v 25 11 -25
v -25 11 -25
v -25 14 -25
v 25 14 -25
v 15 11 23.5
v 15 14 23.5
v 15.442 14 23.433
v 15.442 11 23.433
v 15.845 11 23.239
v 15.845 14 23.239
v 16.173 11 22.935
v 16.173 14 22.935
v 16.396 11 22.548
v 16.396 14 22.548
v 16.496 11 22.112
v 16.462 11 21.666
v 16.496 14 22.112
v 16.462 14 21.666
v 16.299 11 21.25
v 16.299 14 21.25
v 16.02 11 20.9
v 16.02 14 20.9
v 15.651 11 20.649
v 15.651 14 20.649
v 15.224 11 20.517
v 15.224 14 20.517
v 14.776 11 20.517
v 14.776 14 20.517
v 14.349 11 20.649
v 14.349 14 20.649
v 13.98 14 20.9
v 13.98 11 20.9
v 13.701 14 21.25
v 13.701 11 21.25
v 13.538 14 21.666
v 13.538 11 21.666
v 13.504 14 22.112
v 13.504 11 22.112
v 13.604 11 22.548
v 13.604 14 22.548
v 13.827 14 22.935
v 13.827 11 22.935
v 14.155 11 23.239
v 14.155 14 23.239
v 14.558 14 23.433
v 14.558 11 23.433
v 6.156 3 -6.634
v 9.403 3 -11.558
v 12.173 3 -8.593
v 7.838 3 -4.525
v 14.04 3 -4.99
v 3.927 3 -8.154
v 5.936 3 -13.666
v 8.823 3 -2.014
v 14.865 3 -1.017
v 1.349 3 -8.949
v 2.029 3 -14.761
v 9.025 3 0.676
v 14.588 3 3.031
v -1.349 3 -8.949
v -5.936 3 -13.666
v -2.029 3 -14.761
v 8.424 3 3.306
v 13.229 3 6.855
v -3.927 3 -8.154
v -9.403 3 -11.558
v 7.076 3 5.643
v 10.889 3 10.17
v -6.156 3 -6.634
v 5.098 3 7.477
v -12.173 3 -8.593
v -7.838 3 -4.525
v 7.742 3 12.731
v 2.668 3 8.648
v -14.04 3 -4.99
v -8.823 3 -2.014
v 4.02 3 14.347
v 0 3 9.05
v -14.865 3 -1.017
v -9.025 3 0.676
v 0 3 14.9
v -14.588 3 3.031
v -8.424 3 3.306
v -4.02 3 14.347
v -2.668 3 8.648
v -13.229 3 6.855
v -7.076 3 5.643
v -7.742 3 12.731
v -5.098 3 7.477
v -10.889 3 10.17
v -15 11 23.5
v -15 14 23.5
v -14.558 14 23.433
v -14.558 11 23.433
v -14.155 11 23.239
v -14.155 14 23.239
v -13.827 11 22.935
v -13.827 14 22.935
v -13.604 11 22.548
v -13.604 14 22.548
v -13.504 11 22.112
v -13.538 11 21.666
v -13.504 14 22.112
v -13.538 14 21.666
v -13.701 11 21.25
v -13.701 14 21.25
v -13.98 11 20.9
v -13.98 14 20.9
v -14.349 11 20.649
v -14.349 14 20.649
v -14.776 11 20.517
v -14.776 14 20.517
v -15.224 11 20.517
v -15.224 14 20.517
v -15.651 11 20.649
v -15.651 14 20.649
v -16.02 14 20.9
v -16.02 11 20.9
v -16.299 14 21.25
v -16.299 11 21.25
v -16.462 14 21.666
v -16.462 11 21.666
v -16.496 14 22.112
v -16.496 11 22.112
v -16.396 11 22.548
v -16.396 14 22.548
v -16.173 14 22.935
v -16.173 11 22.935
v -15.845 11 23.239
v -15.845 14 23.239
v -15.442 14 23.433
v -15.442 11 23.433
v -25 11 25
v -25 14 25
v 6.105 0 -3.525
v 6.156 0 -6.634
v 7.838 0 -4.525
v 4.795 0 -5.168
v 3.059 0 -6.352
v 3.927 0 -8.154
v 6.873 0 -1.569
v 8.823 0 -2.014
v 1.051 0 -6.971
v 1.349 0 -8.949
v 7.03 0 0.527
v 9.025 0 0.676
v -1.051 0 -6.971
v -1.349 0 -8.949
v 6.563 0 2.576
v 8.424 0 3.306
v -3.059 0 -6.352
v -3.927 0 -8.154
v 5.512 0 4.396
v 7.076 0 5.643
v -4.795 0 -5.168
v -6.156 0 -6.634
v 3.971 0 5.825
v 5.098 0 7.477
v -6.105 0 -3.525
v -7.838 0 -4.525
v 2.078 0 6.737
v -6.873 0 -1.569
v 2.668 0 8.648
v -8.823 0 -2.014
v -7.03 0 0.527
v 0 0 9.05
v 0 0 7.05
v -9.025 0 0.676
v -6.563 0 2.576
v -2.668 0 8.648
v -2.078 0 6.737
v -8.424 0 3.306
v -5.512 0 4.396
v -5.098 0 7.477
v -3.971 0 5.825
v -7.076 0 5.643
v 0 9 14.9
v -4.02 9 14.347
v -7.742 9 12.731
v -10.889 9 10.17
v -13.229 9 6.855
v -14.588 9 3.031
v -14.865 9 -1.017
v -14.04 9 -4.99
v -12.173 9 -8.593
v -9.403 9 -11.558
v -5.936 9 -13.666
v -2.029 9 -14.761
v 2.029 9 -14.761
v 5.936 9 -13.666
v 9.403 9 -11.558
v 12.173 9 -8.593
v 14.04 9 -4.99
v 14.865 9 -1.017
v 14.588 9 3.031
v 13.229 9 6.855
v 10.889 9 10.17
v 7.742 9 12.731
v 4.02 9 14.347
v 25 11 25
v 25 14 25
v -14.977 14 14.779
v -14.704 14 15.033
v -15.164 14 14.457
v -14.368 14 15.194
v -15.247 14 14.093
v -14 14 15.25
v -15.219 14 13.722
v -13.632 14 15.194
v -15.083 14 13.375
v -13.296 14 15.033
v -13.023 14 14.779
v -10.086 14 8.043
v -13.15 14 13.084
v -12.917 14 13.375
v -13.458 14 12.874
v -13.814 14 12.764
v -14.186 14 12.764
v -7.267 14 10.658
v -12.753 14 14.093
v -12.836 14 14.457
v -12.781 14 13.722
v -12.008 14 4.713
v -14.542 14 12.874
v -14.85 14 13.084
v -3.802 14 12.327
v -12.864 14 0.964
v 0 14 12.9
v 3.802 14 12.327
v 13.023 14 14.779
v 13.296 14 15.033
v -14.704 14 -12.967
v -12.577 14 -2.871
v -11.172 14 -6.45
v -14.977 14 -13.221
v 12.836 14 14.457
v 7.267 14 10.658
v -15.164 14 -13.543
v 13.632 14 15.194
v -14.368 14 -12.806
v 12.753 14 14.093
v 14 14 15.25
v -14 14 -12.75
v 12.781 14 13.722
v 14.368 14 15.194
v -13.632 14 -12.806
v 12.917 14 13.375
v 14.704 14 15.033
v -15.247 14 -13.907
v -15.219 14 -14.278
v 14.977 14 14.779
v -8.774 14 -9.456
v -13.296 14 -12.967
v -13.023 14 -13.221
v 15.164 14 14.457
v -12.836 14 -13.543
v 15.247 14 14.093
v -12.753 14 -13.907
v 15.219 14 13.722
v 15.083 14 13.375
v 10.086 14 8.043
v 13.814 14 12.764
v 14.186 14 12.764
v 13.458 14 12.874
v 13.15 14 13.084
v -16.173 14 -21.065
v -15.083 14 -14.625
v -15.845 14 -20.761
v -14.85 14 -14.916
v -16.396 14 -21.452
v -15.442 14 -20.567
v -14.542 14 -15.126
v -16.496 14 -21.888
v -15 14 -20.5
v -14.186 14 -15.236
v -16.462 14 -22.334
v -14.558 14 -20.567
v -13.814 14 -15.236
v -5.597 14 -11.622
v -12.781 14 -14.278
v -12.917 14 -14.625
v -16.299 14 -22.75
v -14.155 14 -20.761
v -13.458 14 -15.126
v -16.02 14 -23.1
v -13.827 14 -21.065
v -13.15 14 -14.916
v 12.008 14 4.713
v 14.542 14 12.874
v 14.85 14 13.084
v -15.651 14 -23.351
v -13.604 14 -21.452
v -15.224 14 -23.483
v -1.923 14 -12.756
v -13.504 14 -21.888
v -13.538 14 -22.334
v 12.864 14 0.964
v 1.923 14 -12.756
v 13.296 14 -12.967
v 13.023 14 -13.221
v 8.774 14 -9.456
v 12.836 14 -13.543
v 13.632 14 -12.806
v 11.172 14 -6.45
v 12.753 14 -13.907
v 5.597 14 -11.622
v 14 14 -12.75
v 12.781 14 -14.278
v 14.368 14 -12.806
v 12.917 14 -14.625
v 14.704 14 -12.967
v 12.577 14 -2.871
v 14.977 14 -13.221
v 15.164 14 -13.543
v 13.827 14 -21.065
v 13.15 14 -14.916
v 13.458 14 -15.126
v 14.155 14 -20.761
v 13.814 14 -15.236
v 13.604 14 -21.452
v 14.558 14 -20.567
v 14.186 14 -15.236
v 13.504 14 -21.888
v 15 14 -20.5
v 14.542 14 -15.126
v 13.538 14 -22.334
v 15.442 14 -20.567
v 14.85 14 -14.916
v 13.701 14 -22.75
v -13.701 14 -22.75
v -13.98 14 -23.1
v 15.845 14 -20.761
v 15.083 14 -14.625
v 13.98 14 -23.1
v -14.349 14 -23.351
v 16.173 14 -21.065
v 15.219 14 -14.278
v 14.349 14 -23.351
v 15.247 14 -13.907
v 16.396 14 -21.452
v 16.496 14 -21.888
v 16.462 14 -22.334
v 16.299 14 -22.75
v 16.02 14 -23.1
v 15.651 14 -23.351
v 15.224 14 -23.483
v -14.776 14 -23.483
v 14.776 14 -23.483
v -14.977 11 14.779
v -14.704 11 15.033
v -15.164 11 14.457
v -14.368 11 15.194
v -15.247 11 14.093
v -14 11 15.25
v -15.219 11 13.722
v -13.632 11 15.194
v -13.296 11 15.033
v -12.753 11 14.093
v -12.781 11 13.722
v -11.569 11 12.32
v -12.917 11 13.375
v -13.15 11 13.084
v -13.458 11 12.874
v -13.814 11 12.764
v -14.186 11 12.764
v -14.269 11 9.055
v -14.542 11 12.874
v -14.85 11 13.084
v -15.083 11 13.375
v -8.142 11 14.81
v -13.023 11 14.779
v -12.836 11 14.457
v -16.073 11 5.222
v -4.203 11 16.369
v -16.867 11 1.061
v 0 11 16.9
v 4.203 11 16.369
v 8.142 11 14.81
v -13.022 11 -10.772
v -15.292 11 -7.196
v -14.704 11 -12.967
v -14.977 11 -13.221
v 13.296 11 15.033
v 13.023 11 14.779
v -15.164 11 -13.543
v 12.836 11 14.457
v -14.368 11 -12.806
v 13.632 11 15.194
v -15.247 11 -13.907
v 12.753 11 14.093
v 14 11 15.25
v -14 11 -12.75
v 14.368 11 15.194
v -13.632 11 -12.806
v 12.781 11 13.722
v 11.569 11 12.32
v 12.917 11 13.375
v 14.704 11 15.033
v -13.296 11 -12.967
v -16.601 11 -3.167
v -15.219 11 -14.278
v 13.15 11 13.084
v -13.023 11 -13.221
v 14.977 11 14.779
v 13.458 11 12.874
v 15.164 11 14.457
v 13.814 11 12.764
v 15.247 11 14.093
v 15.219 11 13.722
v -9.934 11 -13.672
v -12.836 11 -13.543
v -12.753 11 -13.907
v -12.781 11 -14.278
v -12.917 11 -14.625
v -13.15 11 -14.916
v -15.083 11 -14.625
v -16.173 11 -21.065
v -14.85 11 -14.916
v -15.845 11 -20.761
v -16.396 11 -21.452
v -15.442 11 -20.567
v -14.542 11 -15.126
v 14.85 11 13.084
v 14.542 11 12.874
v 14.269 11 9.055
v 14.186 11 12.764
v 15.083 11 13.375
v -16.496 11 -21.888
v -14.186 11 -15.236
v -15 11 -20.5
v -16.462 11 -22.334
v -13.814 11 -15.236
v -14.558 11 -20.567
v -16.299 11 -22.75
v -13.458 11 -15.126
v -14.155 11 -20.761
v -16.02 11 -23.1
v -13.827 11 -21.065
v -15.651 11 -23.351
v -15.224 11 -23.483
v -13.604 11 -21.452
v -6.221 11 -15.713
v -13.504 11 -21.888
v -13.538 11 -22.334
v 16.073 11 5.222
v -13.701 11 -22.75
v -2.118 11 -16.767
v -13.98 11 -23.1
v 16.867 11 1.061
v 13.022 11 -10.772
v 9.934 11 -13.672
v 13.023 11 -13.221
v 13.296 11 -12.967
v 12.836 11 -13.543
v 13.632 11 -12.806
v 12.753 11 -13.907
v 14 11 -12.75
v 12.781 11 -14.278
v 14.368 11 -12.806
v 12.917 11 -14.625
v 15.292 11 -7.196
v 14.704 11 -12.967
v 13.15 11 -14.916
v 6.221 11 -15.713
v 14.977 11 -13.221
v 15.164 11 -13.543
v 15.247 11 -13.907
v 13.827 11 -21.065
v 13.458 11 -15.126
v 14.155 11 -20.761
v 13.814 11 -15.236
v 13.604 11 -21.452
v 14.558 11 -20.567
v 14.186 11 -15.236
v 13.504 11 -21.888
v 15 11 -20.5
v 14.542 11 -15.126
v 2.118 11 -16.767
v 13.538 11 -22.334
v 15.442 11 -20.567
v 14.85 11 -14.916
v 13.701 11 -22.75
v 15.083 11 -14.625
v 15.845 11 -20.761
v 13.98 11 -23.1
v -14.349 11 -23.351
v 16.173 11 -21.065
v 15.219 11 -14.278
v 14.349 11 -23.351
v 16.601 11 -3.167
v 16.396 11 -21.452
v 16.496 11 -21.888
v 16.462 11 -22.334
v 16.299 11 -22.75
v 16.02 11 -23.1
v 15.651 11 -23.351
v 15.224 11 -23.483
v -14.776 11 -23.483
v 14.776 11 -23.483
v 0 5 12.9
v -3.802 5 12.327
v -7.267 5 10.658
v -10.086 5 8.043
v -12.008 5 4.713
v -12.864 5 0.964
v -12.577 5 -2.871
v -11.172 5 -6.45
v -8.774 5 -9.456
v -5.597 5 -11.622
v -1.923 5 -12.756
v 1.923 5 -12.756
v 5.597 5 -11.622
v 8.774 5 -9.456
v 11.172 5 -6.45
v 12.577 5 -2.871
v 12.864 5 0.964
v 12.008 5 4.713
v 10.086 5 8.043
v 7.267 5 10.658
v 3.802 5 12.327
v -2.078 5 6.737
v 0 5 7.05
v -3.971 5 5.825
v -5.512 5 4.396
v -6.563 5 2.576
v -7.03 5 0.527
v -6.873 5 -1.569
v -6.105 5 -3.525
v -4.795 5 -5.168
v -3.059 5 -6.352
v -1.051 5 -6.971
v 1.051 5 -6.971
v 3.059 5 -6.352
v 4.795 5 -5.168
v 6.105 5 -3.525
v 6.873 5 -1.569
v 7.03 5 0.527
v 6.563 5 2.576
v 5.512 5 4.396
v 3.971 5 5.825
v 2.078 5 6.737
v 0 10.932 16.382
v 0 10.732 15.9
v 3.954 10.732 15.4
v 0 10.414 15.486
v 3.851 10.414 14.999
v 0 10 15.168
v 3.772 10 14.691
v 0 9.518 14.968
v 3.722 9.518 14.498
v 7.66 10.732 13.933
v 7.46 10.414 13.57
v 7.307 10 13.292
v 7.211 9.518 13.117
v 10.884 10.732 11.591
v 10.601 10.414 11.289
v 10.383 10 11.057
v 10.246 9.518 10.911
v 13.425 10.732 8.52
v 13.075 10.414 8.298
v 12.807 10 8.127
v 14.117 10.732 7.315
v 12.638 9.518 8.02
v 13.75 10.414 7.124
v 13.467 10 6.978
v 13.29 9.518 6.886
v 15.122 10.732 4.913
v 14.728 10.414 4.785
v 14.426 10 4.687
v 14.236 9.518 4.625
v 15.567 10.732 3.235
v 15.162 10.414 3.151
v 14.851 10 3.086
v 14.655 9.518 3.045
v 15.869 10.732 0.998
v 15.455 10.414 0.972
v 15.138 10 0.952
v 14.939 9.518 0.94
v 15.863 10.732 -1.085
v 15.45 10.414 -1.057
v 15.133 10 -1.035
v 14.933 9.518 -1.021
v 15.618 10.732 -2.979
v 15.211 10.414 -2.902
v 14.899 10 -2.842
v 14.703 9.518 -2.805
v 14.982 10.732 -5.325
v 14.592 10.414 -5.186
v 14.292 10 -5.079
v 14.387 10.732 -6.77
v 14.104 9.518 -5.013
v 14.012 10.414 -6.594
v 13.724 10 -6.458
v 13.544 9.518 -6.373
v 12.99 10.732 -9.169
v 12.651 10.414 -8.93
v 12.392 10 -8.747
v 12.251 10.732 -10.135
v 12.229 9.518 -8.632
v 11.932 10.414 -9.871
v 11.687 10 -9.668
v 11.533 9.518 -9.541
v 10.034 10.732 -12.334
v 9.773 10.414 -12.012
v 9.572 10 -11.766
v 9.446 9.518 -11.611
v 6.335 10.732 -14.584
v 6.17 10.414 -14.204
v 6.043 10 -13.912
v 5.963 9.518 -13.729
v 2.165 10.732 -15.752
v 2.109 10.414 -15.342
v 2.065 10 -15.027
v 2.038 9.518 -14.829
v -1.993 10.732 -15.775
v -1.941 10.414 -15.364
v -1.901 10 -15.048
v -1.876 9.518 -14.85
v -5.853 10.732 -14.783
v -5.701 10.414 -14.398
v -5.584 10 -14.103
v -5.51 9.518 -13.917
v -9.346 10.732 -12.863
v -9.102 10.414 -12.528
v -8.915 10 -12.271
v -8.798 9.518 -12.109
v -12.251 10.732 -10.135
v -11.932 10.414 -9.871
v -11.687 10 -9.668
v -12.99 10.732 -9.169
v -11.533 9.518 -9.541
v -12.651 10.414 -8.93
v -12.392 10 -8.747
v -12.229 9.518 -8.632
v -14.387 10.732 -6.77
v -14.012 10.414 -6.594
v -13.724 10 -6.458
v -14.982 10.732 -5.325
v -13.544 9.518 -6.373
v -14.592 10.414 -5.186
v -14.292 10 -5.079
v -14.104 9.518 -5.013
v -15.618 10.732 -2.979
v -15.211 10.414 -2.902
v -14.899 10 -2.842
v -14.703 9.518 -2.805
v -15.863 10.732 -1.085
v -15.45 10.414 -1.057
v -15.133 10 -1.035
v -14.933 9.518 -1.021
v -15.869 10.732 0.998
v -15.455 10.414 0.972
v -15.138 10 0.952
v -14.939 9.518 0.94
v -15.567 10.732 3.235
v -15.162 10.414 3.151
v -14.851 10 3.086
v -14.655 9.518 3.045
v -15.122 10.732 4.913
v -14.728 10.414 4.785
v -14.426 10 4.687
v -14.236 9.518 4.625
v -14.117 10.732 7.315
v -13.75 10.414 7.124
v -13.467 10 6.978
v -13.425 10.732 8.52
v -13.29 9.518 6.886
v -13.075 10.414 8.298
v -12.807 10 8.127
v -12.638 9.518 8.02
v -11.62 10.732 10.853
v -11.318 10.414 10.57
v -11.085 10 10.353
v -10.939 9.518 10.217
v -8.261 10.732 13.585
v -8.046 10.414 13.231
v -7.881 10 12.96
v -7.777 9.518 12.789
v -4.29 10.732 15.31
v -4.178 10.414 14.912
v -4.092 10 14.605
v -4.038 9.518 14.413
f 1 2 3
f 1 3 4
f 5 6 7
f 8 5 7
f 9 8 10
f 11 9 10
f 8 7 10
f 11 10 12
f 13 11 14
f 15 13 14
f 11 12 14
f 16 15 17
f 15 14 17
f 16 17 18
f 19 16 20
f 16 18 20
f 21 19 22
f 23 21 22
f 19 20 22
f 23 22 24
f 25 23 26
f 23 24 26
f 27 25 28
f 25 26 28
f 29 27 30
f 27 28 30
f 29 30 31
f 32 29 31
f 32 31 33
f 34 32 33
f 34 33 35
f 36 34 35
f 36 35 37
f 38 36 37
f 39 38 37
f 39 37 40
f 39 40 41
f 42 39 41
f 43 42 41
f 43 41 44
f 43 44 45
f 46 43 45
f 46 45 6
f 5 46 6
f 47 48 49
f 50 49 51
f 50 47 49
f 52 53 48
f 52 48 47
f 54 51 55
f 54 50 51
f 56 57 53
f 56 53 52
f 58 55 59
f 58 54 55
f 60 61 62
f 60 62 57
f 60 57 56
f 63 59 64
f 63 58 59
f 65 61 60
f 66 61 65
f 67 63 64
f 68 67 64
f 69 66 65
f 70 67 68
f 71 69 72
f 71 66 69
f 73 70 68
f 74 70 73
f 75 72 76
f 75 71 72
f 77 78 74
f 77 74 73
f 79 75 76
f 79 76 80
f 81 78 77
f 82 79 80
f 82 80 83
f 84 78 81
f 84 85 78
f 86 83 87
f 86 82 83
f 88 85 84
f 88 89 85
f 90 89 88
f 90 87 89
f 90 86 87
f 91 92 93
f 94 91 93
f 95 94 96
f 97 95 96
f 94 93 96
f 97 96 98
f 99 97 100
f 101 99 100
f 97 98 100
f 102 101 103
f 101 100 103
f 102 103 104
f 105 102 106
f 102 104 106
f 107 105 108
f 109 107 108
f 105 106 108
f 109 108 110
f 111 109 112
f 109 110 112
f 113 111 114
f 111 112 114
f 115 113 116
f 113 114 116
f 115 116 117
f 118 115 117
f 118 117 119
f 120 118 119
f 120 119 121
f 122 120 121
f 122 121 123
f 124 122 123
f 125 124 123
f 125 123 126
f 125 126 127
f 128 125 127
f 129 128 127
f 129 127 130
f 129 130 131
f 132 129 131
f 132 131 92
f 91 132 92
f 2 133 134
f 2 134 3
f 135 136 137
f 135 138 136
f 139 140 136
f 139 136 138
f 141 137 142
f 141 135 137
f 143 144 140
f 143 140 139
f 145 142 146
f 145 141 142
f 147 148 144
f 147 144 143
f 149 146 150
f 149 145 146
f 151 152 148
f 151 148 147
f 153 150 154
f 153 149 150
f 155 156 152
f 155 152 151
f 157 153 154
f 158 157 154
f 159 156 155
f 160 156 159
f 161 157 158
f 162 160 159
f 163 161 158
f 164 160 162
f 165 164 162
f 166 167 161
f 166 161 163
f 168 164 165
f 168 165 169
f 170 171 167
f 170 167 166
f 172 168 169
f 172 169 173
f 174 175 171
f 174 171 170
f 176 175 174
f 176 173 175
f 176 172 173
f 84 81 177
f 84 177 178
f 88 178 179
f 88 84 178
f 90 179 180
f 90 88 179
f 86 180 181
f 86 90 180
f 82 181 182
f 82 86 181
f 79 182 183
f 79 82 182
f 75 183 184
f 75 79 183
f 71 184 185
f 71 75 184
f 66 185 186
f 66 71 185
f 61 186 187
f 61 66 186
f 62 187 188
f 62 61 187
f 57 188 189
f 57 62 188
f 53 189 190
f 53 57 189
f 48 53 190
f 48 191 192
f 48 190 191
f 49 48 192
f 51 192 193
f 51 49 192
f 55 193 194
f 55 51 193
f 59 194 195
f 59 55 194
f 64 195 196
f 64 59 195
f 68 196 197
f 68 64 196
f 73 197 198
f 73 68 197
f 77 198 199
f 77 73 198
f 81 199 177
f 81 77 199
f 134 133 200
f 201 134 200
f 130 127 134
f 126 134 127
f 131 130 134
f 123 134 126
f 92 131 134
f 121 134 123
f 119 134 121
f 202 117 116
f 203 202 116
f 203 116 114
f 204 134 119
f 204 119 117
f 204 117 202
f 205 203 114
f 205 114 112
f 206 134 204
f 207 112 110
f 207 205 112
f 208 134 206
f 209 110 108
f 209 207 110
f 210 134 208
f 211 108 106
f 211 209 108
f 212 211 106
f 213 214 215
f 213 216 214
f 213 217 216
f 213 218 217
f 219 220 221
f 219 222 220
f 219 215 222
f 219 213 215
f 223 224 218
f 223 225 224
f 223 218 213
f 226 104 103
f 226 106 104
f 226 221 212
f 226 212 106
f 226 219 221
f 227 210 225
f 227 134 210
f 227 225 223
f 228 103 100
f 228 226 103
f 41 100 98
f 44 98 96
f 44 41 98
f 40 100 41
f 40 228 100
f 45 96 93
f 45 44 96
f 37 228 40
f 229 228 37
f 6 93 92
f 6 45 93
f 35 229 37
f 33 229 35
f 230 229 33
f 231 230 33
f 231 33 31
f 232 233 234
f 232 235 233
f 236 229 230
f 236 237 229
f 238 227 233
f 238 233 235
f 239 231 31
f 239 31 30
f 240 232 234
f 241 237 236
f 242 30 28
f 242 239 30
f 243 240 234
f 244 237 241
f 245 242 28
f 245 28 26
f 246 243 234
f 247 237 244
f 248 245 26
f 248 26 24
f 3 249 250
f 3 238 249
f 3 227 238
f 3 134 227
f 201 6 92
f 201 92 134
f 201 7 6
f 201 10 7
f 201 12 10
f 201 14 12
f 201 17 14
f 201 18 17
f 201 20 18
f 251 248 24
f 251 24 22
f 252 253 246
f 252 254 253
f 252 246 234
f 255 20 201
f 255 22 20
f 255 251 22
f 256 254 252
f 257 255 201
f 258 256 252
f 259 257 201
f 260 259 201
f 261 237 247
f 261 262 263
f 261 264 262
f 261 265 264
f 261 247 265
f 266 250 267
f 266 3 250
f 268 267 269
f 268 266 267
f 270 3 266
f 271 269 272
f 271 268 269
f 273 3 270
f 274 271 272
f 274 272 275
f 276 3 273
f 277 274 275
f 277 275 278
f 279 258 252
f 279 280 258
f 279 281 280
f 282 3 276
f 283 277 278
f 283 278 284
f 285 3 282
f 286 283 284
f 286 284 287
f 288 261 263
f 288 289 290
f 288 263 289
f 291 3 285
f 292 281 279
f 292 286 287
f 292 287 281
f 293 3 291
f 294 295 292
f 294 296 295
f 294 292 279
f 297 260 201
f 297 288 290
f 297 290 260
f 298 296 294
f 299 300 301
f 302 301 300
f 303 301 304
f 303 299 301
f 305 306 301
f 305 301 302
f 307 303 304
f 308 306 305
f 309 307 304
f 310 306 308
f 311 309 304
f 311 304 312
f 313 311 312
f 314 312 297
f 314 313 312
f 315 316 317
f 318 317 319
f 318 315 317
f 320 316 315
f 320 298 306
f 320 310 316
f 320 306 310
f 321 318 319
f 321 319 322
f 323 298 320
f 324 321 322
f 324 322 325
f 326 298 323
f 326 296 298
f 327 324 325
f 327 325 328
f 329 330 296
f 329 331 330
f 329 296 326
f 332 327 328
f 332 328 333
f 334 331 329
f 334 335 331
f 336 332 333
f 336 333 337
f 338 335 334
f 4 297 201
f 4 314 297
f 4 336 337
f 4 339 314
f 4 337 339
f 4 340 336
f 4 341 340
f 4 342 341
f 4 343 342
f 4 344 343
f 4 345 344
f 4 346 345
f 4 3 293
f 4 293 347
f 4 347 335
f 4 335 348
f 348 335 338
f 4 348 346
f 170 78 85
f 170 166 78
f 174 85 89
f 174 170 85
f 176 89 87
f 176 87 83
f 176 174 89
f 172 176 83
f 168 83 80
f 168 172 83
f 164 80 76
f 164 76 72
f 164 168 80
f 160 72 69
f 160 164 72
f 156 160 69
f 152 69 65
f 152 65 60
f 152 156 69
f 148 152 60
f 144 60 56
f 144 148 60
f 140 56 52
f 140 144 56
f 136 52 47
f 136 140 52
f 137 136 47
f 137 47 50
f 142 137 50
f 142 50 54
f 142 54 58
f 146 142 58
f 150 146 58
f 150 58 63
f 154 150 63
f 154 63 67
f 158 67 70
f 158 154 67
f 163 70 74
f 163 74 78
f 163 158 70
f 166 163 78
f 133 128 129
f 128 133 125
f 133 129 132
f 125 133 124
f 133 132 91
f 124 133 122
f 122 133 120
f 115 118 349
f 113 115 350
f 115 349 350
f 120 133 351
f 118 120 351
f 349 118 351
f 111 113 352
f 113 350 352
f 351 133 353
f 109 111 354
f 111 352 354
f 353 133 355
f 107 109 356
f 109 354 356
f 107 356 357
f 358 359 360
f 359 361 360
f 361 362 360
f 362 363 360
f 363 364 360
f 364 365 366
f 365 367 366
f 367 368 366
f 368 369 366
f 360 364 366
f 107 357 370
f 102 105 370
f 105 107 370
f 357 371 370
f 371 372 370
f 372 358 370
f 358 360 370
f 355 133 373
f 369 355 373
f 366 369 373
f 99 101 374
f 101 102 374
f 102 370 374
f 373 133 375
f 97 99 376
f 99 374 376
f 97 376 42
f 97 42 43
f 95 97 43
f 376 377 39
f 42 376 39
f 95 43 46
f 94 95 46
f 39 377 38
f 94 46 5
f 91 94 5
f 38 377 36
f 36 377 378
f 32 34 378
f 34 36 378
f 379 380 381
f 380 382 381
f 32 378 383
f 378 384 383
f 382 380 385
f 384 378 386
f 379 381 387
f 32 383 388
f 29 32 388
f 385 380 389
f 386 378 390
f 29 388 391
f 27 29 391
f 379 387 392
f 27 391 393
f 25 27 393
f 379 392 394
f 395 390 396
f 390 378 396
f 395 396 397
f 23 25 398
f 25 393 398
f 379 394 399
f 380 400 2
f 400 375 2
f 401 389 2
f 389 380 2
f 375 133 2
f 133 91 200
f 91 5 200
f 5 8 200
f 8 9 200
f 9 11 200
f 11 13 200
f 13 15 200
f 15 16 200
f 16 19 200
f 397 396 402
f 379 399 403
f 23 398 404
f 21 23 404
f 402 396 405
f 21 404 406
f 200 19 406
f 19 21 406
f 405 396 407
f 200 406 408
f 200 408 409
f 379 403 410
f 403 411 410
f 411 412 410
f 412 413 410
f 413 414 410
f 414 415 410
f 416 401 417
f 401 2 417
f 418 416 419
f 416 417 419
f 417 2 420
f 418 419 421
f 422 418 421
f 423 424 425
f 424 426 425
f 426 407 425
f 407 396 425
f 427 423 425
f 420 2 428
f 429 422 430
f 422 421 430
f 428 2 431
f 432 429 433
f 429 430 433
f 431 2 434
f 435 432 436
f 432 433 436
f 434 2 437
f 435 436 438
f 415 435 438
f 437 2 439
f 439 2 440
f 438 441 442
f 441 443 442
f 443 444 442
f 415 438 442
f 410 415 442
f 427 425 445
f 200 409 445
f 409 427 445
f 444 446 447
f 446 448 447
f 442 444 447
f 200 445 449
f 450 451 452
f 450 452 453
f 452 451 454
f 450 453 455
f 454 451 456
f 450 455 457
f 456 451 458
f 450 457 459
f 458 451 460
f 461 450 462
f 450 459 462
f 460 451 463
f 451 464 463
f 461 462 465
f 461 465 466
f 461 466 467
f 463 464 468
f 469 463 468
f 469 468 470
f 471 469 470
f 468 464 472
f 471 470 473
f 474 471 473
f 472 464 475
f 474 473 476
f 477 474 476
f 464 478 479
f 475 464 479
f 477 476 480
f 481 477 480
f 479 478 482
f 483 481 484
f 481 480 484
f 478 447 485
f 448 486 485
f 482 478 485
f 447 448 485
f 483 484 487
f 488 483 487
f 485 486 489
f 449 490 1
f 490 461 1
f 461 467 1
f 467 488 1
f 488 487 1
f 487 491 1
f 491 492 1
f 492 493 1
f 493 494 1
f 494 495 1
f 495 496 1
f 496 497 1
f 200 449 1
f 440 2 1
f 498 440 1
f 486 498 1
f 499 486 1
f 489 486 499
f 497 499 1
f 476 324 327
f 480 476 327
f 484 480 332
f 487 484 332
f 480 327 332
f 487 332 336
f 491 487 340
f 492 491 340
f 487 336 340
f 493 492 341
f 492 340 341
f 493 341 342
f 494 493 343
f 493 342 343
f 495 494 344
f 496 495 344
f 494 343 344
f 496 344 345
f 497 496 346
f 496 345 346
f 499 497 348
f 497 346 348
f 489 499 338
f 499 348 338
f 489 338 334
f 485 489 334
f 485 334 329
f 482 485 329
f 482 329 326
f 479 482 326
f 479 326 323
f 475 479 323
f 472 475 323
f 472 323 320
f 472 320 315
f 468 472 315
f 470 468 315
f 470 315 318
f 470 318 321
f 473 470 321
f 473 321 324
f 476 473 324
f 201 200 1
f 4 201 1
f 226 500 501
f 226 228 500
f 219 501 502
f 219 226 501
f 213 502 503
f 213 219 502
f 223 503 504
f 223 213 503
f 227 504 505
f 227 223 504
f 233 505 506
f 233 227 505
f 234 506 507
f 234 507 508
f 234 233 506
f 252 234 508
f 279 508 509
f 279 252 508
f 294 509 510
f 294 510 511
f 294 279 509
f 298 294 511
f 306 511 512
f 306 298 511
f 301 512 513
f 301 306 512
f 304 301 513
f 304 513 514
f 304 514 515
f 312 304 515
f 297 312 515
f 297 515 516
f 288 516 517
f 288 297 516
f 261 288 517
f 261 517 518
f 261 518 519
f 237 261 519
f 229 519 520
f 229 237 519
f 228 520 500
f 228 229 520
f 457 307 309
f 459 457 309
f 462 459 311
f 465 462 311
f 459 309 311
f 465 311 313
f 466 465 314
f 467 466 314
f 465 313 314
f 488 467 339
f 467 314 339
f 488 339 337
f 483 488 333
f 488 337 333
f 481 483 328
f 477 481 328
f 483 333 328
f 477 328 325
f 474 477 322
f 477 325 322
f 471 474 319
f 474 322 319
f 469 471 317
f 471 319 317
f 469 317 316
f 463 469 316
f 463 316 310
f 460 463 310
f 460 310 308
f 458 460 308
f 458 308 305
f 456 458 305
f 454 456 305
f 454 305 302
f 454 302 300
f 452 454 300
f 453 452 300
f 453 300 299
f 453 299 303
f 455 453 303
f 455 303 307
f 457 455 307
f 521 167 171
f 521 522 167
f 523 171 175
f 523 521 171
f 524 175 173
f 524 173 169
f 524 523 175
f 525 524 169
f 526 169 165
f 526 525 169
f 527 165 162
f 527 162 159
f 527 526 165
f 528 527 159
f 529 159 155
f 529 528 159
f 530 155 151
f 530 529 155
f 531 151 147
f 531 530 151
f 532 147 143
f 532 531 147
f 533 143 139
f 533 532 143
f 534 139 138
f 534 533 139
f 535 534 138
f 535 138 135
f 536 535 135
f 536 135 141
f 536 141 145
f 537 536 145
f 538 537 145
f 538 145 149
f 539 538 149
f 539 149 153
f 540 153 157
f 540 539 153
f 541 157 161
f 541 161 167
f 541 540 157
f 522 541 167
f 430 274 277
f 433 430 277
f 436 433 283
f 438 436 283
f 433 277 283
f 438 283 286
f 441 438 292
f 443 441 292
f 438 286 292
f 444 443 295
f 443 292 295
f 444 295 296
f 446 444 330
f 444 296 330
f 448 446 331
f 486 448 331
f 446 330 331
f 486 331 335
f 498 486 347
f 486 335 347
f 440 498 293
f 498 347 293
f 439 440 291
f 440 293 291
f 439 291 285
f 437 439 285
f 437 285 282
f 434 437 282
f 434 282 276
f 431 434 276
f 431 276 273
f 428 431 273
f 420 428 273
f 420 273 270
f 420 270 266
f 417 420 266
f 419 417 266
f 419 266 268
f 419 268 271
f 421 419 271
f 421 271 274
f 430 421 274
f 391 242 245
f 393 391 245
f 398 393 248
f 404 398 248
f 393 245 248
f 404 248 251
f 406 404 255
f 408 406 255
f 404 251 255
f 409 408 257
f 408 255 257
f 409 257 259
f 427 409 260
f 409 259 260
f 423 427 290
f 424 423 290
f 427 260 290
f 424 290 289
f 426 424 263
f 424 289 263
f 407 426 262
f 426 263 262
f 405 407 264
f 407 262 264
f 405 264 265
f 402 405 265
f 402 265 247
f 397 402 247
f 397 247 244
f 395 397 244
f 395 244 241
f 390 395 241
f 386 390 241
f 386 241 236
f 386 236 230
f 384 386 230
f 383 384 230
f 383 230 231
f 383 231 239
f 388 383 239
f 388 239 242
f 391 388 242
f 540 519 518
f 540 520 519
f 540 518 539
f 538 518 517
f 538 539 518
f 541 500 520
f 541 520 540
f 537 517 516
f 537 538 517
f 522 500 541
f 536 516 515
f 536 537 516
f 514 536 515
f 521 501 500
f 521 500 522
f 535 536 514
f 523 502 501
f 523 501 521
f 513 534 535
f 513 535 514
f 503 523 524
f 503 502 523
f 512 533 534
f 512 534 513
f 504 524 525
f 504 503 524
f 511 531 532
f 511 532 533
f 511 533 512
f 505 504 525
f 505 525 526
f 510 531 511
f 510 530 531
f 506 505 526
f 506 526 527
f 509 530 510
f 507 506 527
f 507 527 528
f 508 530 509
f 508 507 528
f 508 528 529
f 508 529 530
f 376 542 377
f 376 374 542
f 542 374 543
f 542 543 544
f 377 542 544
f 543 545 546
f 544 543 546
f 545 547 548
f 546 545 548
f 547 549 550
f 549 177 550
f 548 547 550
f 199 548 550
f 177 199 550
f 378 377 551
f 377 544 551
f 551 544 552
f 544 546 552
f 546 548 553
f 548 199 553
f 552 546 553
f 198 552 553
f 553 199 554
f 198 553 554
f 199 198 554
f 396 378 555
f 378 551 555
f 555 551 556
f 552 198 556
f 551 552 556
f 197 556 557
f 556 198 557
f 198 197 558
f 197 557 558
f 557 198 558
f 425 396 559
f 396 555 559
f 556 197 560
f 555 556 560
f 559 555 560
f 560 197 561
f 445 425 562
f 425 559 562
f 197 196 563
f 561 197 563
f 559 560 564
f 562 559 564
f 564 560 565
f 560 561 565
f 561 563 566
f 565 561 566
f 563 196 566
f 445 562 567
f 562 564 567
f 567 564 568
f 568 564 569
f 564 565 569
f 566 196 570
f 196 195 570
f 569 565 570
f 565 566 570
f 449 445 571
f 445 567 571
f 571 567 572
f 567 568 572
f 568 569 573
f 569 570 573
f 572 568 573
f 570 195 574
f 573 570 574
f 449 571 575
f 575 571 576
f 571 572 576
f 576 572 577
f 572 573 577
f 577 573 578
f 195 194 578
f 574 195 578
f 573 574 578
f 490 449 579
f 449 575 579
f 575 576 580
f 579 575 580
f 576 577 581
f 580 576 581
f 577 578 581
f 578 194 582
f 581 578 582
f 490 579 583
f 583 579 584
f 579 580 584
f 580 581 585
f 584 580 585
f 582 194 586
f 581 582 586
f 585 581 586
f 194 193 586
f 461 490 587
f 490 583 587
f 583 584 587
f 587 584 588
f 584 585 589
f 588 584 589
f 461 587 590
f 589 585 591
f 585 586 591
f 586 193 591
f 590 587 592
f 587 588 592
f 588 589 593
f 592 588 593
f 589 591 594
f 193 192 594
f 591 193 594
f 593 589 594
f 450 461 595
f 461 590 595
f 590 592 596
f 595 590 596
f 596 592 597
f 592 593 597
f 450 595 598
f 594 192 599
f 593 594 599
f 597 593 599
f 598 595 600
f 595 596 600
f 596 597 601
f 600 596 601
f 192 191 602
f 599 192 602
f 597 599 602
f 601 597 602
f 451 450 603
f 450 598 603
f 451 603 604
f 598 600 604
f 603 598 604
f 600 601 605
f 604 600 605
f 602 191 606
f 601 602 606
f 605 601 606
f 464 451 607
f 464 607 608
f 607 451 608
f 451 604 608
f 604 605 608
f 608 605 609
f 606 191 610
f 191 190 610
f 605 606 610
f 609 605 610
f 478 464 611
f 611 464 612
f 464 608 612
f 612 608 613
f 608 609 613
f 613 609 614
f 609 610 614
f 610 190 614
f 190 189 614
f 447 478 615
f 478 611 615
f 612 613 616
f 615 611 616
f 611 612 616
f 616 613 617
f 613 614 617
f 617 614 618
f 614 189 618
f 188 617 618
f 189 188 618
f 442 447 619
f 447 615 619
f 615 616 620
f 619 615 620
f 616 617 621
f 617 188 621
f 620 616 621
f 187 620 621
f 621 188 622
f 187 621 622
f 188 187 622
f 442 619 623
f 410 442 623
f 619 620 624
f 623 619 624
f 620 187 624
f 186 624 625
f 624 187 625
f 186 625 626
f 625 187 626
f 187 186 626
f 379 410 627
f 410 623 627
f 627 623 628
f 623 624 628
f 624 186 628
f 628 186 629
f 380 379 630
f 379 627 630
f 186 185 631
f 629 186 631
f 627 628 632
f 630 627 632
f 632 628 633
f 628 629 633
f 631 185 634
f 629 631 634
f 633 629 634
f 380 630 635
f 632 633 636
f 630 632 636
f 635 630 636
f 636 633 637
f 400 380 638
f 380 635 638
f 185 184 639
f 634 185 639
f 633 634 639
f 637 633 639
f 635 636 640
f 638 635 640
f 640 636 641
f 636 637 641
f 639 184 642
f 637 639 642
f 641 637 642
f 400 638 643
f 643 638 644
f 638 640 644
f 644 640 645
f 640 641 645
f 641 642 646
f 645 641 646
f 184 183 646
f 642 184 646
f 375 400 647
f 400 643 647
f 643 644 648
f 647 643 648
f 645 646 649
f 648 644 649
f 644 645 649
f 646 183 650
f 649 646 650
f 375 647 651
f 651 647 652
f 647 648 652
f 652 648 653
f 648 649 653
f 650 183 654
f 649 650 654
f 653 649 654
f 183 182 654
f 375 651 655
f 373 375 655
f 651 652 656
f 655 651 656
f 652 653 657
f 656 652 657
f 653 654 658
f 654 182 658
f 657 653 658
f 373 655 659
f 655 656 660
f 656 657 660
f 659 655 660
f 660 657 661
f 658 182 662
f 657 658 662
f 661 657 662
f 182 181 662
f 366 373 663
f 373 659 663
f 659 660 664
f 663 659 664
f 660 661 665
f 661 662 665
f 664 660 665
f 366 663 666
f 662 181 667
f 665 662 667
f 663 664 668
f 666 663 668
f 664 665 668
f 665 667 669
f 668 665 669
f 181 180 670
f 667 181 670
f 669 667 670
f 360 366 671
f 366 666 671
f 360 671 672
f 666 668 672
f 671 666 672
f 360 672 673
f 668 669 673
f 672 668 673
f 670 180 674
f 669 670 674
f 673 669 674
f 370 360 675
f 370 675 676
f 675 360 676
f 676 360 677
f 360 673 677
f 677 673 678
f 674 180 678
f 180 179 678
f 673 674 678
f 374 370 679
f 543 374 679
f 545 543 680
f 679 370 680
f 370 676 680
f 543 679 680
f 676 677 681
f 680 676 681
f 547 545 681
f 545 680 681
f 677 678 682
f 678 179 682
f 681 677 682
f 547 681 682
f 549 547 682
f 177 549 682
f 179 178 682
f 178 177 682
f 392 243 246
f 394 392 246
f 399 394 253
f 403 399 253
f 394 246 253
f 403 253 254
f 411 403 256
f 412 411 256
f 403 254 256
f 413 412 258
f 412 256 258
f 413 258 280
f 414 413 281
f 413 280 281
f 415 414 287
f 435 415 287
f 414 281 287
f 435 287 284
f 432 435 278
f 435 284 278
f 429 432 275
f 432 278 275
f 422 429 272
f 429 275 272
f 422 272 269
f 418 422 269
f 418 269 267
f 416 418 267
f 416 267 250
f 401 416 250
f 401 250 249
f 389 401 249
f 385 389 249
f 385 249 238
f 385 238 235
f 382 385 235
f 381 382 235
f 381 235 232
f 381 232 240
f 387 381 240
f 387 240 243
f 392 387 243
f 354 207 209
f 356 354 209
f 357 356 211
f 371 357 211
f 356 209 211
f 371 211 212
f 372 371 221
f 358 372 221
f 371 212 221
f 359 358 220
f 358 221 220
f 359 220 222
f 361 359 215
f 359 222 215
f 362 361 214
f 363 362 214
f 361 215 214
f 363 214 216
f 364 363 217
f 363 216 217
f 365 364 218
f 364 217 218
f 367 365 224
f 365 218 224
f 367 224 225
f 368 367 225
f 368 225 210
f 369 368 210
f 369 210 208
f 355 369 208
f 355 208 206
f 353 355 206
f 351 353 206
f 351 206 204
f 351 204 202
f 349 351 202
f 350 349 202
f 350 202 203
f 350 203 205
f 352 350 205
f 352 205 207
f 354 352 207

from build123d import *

# Parameters (mm, degrees)
BOSS_EXTRUDE1_START = -3
SKETCH3_W           = 50
SKETCH3_H           = 50
SKETCH3_R           = 14.9
BOSS_EXTRUDE1_DEPTH = 3
SKETCH4_R           = 1.25
SKETCH4_R_2         = 1.5
CUT_EXTRUDE1_DEPTH  = 39.026306684
FILLET1_R           = 2


with BuildPart() as part:
    # Sketch2 → Revolve-Thin1 (revolve)
    with BuildSketch(Plane.XY, mode=Mode.PRIVATE) as revolve_thin1_sk:
        Polygon((7.05, 0), (7.05, 5), (12.9, 5), (12.9, 14), (14.9, 14), (14.9, 3), (9.05, 3), (9.05, 0), align=None)
    revolve(revolve_thin1_sk.sketch.rotate(Axis((0, 56.528570812, 0), (0, -1, 0)), 90), axis=Axis((0, 56.528570812, 0), (0, -1, 0)))

    # Sketch3 → Boss-Extrude1 (add)
    with BuildSketch(Plane(origin=(0, 14, 0), x_dir=(1, 0, 0), z_dir=(0, 1, 0)).offset(BOSS_EXTRUDE1_START)):
        Rectangle(SKETCH3_W, SKETCH3_H)
        with Locations(Location((0, 0, 0), (0, 0, 270))):
            Circle(SKETCH3_R, mode=Mode.SUBTRACT)
    extrude(amount=BOSS_EXTRUDE1_DEPTH)

    # Sketch4 → Cut-Extrude1 (cut, through all)
    with BuildSketch(Plane(origin=(0, 14, 0), x_dir=(1, 0, 0), z_dir=(0, 1, 0))):
        with Locations(Location((14, 14, 0), (0, 0, 270))):
            Circle(SKETCH4_R)
        with Locations(Location((-14, 14, 0), (0, 0, 270))):
            Circle(SKETCH4_R)
        with Locations(Location((-14, -14, 0), (0, 0, 270))):
            Circle(SKETCH4_R)
        with Locations(Location((14, -14, 0), (0, 0, 270))):
            Circle(SKETCH4_R)
        with Locations(Location((-15, 22, 0), (0, 0, 270))):
            Circle(SKETCH4_R_2)
        with Locations(Location((15, 22, 0), (0, 0, 270))):
            Circle(SKETCH4_R_2)
        with Locations(Location((15, -22, 0), (0, 0, 270))):
            Circle(SKETCH4_R_2)
        with Locations(Location((-15, -22, 0), (0, 0, 270))):
            Circle(SKETCH4_R_2)
    extrude(amount=-CUT_EXTRUDE1_DEPTH, mode=Mode.SUBTRACT)

    # Fillet1
    fillet1_edges = [part.edges().sort_by_distance(p)[0] for p in [
        (0, 11, -14.9),
    ]]
    fillet(fillet1_edges, radius=FILLET1_R)


solid = part.part
